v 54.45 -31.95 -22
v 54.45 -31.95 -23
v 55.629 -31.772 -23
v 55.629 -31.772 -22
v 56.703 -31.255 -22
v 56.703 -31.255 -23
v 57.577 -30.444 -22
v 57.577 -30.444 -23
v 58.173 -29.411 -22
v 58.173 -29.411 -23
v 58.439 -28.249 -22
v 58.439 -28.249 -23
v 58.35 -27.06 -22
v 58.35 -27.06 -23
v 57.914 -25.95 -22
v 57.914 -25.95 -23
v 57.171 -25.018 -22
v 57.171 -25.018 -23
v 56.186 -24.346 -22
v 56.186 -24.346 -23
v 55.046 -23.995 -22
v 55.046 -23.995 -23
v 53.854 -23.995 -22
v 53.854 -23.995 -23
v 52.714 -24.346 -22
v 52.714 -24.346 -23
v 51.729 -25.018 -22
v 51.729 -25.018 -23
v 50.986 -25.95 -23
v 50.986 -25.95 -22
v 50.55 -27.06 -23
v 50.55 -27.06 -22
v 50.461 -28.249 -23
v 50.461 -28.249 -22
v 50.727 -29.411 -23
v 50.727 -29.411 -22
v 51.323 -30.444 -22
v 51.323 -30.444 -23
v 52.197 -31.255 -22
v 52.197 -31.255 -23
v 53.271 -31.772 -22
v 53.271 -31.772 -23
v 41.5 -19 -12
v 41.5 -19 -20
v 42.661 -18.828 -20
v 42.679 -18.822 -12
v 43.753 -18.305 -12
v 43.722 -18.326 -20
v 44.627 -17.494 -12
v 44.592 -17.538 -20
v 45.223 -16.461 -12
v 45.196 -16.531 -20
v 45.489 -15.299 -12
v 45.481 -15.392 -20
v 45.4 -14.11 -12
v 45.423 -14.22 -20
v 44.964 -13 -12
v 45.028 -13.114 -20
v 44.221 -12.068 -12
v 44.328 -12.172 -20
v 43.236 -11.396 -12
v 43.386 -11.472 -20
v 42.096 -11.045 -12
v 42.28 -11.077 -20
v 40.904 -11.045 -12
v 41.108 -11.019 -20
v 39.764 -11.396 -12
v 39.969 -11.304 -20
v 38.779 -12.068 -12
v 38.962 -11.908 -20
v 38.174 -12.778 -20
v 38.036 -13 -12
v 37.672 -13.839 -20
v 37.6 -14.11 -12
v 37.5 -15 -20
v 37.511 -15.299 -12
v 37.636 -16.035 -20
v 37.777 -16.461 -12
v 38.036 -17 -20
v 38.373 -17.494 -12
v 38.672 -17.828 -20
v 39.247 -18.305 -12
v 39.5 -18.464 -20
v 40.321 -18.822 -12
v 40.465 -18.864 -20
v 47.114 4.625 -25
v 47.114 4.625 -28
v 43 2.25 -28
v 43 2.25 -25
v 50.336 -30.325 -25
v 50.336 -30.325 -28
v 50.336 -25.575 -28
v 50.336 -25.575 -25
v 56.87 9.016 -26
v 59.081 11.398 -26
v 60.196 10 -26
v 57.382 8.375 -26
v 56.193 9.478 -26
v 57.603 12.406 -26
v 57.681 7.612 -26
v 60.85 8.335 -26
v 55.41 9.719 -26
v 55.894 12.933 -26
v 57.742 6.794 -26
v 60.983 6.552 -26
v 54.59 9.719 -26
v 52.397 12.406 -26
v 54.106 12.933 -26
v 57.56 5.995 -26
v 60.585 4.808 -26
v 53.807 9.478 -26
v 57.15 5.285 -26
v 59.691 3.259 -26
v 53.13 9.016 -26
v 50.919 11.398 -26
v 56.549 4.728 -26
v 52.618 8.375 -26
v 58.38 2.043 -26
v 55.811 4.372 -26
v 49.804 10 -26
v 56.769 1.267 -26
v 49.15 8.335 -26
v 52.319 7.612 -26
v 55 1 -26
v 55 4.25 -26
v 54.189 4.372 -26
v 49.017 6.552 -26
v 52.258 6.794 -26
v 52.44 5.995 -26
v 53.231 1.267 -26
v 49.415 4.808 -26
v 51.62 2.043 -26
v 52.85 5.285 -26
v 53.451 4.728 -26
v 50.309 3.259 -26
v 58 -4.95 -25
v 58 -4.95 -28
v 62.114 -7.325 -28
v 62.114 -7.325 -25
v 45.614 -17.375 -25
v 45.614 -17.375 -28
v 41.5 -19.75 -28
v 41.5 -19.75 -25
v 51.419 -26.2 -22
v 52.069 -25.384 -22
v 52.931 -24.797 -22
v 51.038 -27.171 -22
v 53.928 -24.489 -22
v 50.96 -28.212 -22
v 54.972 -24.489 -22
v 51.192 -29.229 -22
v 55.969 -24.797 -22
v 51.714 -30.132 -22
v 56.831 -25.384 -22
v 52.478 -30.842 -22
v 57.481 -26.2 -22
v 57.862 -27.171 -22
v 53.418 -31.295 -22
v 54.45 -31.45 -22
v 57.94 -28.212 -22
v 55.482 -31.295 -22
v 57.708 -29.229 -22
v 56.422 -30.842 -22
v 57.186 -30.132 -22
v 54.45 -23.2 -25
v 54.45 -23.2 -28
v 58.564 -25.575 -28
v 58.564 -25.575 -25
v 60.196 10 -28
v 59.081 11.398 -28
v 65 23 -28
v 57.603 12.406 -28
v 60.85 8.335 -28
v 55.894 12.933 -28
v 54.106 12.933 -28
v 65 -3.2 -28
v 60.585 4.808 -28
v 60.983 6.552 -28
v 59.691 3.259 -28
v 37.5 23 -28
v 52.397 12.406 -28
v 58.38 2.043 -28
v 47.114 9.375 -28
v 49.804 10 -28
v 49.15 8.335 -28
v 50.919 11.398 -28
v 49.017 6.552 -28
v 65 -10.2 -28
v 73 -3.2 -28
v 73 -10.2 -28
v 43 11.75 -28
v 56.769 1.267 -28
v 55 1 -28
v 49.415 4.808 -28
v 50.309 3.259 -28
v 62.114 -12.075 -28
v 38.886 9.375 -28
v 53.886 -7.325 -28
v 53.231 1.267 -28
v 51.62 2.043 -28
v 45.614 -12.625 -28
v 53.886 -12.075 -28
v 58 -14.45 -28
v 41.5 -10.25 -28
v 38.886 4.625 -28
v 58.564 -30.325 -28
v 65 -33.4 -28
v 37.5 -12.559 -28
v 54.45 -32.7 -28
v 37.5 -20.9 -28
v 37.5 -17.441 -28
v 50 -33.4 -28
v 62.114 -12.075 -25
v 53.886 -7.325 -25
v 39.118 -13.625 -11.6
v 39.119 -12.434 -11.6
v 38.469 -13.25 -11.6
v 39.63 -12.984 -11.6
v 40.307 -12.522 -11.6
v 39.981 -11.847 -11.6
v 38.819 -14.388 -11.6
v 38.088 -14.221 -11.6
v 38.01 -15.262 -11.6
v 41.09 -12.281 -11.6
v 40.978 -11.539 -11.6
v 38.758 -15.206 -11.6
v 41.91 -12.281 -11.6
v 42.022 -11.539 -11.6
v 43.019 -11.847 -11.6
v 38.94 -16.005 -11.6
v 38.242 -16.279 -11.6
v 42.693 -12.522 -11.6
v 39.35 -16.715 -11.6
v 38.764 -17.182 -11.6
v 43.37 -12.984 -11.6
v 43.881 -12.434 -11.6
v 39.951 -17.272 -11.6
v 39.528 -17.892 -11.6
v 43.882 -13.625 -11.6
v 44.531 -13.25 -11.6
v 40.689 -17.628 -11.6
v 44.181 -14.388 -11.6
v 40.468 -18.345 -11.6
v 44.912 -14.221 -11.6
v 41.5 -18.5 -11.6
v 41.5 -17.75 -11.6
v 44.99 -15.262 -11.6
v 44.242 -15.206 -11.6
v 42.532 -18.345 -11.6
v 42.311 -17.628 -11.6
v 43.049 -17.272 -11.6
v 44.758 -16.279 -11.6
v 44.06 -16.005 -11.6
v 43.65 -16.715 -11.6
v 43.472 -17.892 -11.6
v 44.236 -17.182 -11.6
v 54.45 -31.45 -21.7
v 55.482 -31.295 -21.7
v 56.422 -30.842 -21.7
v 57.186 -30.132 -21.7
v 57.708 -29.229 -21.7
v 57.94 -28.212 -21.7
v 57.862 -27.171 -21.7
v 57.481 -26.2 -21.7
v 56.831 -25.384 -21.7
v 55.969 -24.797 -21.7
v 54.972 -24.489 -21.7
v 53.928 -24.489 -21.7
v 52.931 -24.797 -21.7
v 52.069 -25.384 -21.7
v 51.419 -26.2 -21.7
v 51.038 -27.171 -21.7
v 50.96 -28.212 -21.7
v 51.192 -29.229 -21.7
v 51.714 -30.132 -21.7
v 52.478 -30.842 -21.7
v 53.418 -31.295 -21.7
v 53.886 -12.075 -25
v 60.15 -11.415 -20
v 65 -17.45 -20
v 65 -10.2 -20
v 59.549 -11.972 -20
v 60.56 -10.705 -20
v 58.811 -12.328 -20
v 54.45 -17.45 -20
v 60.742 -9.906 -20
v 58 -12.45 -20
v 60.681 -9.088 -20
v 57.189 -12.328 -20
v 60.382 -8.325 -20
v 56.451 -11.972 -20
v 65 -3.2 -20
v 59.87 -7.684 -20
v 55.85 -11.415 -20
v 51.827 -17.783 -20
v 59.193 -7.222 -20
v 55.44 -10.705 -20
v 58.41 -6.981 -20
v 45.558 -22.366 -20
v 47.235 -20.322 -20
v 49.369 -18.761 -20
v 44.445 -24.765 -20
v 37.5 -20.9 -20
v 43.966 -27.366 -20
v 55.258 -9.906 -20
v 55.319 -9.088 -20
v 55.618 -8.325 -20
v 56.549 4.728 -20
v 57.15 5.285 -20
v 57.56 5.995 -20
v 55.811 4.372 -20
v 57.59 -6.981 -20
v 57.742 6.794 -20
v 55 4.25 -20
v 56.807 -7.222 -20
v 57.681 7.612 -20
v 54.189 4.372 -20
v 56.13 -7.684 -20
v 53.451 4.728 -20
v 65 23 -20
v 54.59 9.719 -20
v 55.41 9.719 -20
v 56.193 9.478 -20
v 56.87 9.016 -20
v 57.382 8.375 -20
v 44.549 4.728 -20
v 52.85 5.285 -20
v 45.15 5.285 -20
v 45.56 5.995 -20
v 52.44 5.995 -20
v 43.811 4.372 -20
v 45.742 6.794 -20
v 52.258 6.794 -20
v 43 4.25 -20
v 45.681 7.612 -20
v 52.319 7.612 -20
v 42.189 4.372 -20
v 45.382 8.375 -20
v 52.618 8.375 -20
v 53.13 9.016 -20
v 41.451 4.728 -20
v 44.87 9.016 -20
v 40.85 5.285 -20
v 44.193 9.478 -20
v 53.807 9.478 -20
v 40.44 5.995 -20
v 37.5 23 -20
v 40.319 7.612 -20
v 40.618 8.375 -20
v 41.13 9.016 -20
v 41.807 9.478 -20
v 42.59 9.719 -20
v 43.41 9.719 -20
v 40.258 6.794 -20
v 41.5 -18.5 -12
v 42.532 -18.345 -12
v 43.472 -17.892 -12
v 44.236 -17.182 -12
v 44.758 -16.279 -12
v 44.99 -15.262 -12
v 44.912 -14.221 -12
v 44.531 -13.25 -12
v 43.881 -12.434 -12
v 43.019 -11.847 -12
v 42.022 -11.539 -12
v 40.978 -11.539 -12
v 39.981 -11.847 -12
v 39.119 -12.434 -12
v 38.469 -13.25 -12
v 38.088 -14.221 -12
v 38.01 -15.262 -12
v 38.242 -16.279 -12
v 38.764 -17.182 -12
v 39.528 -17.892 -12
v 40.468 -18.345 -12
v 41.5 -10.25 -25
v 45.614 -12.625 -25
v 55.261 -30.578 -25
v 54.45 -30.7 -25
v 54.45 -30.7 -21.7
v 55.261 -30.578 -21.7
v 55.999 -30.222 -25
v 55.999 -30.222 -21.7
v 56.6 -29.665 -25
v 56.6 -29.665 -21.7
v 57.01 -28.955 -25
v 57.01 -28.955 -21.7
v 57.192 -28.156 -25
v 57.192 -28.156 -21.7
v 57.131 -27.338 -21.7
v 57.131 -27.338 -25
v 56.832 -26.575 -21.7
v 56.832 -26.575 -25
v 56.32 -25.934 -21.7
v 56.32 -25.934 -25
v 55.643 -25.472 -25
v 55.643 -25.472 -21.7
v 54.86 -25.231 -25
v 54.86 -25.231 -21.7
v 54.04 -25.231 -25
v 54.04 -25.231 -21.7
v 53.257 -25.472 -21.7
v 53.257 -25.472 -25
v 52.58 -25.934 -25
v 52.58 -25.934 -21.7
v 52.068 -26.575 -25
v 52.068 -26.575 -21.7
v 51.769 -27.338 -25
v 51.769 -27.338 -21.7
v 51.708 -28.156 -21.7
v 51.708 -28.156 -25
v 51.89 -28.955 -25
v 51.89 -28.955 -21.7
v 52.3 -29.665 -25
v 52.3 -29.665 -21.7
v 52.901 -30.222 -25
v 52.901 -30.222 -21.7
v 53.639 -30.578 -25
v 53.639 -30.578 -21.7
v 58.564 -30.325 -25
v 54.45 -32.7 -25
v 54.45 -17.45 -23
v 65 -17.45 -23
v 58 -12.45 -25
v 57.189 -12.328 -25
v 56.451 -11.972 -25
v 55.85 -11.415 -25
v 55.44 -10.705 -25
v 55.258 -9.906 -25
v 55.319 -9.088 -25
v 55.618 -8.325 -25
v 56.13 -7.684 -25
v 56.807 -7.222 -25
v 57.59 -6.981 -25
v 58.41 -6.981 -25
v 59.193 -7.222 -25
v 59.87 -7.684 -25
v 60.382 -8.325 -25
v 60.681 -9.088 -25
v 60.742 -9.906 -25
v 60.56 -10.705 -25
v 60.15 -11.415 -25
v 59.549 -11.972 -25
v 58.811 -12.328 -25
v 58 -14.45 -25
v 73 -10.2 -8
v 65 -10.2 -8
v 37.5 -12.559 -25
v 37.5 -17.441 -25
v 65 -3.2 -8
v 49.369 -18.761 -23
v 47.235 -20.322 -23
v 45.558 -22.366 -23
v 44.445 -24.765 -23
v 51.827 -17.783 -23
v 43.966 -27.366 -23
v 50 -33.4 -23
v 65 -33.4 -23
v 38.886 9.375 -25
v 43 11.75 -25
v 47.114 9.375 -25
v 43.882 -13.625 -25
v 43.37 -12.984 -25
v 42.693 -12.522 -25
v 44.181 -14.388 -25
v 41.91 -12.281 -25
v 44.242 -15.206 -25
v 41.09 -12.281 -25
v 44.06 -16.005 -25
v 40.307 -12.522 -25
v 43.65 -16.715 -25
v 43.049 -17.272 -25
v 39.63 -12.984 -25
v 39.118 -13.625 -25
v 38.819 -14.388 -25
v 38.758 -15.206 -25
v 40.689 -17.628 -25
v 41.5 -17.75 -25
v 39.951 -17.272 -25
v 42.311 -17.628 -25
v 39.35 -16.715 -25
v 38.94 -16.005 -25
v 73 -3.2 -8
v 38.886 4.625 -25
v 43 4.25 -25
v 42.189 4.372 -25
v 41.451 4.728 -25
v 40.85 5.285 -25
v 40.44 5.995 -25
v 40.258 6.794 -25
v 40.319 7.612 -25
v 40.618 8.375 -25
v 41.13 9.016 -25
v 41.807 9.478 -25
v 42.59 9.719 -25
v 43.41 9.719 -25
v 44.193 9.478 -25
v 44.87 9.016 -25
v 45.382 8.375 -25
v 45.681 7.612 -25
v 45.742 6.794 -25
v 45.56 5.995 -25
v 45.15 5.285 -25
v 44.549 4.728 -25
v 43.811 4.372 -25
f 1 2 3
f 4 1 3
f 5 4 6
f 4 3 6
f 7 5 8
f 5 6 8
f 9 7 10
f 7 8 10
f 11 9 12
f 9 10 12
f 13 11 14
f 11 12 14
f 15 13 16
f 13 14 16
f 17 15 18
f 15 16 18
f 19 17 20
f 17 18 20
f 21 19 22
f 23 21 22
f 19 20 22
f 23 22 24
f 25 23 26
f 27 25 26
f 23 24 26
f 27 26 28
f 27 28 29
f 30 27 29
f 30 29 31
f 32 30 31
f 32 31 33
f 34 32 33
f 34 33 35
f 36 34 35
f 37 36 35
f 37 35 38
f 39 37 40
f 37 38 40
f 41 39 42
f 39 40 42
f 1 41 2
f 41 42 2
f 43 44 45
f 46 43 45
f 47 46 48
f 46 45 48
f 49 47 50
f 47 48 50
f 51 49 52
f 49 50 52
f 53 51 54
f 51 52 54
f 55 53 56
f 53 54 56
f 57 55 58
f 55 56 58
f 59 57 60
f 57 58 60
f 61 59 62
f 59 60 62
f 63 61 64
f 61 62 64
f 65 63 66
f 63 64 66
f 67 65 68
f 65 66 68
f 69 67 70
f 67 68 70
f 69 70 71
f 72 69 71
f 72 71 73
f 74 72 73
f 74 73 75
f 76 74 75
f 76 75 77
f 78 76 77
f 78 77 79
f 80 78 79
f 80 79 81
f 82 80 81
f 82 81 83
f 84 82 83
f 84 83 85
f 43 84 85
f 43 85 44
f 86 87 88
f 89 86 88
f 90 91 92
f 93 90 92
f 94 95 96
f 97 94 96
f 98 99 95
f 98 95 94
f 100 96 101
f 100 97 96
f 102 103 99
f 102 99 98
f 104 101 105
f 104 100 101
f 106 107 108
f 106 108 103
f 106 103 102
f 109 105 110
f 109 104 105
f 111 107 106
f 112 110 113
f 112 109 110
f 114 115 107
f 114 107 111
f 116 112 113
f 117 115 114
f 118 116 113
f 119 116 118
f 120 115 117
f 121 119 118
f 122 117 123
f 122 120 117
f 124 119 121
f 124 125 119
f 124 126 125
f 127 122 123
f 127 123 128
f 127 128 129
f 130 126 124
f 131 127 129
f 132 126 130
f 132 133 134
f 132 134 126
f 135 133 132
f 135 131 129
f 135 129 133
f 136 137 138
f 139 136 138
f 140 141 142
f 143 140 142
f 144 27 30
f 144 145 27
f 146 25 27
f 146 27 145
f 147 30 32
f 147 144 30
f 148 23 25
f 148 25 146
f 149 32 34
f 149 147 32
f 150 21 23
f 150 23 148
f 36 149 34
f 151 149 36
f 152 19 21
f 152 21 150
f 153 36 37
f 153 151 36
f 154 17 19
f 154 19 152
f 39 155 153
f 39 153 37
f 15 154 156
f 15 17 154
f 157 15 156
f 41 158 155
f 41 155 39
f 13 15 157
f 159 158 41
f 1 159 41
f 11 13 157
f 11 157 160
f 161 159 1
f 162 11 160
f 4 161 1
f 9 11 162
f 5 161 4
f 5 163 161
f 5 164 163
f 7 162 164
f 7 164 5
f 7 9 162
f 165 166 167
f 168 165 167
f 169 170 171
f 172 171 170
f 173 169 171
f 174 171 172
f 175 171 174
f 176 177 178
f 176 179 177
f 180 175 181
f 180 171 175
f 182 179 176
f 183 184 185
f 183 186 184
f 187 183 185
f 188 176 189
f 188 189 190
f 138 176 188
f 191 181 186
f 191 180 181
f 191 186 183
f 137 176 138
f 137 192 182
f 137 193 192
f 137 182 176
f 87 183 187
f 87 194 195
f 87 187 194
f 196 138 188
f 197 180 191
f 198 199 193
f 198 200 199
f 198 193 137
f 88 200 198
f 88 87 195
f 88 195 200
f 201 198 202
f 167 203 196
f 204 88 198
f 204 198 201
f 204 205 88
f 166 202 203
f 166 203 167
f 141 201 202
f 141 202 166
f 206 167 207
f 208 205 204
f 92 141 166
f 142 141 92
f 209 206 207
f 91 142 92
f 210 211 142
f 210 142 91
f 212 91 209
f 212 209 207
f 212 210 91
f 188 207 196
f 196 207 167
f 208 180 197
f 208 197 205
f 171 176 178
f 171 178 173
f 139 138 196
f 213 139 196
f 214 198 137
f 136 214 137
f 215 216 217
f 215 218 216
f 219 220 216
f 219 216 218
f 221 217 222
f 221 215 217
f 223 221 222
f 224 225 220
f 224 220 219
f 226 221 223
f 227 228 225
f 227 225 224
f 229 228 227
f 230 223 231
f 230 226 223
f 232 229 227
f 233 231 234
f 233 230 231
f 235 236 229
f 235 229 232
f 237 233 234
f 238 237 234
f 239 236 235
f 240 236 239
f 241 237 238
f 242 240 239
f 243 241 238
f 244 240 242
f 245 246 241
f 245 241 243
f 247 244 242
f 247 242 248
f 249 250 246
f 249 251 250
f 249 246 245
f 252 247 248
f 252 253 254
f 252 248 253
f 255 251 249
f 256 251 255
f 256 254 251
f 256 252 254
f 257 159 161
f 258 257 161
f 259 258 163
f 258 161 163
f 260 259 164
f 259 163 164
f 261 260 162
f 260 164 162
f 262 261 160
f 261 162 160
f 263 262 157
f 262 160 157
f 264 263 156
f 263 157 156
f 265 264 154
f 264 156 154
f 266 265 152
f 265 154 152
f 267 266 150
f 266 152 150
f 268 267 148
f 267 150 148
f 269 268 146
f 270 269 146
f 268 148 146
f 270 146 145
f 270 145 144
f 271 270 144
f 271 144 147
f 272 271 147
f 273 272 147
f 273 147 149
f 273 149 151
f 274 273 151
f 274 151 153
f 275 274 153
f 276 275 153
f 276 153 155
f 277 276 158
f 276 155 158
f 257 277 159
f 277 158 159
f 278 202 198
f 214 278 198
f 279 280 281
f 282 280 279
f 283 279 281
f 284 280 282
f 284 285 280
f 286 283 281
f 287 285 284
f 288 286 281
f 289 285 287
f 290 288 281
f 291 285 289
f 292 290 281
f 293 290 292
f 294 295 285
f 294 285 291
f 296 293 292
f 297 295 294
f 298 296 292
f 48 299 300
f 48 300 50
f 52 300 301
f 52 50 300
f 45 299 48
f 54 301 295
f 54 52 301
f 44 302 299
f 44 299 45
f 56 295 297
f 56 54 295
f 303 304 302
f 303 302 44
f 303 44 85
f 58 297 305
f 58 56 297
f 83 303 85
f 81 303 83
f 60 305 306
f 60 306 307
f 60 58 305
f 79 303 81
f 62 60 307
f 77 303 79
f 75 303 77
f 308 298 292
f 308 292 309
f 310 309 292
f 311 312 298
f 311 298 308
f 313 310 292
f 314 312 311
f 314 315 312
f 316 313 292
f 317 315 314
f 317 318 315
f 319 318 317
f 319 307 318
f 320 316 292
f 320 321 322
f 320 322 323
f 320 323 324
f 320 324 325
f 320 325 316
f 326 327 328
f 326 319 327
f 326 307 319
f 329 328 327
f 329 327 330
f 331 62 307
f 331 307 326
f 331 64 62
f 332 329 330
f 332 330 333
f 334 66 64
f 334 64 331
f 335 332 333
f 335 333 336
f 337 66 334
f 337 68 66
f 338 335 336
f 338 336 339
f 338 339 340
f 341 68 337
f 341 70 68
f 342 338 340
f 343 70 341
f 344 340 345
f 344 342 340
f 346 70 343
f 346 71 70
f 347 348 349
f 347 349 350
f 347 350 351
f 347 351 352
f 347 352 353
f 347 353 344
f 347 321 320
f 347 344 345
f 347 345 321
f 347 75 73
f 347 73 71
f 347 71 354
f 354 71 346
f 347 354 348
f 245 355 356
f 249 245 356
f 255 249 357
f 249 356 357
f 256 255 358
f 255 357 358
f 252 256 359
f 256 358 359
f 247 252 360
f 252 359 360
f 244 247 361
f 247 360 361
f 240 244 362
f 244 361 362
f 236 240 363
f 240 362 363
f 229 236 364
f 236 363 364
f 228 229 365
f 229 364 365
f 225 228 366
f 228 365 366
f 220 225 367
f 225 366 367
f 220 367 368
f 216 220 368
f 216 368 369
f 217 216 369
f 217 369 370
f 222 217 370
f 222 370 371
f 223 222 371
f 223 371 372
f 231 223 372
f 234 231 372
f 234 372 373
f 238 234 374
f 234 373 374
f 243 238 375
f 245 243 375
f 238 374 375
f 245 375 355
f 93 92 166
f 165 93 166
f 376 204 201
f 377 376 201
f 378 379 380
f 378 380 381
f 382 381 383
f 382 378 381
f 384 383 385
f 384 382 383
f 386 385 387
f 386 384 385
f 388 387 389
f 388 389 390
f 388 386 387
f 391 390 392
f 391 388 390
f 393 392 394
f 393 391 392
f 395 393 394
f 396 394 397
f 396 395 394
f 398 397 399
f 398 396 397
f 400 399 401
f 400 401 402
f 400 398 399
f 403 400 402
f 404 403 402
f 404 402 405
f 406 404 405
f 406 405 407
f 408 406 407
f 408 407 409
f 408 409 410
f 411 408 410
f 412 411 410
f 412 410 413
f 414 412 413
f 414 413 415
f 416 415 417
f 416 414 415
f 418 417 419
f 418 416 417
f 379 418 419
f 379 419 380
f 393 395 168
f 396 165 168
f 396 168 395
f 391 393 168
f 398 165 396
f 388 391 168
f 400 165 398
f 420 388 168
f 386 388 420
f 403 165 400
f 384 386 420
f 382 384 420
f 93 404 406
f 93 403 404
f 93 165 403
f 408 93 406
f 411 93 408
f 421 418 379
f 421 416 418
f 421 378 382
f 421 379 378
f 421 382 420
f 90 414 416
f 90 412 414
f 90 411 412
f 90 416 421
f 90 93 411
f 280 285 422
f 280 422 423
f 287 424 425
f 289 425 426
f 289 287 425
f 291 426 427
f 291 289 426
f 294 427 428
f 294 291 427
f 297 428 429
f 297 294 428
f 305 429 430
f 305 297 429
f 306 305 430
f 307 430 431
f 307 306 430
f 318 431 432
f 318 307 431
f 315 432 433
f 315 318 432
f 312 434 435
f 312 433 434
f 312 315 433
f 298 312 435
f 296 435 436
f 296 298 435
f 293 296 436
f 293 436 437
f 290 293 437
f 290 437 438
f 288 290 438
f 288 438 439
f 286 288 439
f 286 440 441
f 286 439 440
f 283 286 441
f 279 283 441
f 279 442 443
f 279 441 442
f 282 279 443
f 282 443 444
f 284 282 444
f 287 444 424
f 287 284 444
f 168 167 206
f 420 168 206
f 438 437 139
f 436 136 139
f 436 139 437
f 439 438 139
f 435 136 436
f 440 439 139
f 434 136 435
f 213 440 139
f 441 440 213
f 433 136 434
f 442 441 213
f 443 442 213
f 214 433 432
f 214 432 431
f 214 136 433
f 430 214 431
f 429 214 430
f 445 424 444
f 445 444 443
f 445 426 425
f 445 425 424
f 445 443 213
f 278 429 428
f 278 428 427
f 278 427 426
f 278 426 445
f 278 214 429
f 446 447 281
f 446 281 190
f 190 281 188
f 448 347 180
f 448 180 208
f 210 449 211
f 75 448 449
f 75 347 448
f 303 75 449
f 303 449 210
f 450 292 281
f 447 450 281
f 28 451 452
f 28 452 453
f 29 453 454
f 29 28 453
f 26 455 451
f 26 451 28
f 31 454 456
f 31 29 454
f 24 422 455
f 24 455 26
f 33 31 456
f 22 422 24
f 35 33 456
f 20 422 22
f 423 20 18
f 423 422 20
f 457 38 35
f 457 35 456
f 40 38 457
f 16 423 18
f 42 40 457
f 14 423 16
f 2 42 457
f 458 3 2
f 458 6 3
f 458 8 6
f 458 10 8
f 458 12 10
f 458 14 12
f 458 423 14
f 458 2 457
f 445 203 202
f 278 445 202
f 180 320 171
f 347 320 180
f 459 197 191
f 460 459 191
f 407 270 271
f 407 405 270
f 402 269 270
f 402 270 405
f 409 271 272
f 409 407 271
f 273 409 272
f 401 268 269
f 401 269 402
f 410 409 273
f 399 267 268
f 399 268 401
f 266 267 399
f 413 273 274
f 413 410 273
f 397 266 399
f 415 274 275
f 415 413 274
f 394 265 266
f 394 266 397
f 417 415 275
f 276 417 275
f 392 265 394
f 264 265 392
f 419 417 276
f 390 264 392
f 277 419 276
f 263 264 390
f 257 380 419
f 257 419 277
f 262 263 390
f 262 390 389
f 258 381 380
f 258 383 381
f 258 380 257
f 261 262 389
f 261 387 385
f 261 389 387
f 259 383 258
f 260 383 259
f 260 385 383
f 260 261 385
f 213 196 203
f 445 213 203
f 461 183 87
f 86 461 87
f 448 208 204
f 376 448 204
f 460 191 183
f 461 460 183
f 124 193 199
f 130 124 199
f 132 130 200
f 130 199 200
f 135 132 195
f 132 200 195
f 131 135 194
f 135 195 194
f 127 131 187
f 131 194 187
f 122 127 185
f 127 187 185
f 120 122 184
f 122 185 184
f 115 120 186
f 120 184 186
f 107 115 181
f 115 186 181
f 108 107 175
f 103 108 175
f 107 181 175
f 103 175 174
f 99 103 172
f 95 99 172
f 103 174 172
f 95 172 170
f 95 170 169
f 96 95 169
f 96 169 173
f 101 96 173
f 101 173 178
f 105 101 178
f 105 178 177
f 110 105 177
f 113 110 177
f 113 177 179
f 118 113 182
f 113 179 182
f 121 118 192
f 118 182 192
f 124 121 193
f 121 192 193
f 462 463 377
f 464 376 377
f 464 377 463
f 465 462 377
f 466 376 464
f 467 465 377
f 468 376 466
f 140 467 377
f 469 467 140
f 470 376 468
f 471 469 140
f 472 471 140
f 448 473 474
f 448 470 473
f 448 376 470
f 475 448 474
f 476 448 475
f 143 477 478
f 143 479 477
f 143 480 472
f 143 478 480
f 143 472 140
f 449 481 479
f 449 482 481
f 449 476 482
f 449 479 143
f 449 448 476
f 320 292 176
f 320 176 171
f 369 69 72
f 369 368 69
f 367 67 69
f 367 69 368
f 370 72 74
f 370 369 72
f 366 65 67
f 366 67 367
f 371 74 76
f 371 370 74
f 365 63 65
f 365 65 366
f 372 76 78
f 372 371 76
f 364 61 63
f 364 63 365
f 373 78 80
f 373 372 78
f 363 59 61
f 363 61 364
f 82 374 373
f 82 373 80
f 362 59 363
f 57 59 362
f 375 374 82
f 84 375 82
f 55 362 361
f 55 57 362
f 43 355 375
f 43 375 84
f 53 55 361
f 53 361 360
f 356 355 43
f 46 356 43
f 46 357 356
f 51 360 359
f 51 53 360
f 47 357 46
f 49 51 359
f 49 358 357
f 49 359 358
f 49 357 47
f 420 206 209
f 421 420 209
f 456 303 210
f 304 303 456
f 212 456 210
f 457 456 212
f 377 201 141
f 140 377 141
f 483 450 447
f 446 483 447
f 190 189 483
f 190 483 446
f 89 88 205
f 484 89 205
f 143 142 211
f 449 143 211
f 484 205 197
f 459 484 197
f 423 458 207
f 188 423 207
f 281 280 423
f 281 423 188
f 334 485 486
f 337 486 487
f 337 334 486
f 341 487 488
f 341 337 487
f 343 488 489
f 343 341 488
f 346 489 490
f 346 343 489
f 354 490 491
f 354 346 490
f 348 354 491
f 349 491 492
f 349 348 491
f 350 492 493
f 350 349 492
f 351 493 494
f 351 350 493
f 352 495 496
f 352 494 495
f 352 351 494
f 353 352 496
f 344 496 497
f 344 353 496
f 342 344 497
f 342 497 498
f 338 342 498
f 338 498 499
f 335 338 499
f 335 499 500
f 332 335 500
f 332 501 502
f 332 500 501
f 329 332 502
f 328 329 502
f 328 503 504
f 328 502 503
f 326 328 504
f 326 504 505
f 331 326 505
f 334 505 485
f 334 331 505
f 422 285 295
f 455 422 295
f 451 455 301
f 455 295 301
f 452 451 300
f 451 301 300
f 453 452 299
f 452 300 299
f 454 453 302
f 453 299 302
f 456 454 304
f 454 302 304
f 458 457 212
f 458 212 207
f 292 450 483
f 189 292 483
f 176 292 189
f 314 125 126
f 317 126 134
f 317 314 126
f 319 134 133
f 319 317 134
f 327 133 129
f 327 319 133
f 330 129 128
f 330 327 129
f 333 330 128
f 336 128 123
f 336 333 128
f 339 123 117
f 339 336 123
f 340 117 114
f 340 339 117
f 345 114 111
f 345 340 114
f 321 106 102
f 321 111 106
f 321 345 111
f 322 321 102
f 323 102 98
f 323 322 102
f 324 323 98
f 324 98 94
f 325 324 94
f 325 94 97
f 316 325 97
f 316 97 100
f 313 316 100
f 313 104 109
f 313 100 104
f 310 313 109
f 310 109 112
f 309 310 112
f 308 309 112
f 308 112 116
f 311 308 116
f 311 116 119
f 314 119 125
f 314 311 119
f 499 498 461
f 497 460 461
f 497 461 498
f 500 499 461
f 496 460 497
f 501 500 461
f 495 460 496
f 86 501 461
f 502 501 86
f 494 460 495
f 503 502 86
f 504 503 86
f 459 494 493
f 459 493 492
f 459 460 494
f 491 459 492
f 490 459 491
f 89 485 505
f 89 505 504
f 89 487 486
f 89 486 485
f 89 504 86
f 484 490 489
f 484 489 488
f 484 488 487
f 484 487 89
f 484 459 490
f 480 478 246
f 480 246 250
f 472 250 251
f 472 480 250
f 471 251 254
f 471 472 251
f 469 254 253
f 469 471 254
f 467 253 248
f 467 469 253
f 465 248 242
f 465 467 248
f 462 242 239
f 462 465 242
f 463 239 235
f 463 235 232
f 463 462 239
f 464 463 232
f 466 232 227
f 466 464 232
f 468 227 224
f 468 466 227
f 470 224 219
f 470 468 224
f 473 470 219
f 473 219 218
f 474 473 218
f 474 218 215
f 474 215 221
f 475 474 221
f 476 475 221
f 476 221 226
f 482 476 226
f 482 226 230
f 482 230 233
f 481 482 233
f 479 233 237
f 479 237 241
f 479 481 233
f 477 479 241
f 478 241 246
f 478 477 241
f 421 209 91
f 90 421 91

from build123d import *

# Parameters (mm, degrees)
SKETCH007_R             = 2.75
PAD004_DEPTH            = 8
POCKET003_DEPTH         = 3
SKETCH013_R             = 4
SKETCH013_R_2           = 2.75
PAD009_DEPTH            = 1
SKETCH014_R             = 3.5
SKETCH014_R_2           = 2.75
PAD010_DEPTH            = 0.3
SKETCH015_R             = 4
SKETCH015_R_2           = 2.75
PAD011_DEPTH            = 8
SKETCH016_R             = 3.5
SKETCH016_R_2           = 2.75
PAD012_DEPTH            = 0.4
SKETCH018_R             = 6
POCKET005_DEPTH         = 2
POCKET006_DEPTH         = 3
SKETCH022_W             = 7
SKETCH022_H             = 20
PAD015_DEPTH            = 8
BODY001_ROLL_ANGLE      = 180
BODY001_PLACEMENT_ANGLE = -90


with BuildPart() as part:
    # Sketch007 → Pad004 (new body)
    with BuildSketch(Plane.XY):
        Polygon((0, 27.5), (43.9, 27.5), (56.4, 15), (56.4, 0), (0, 0), align=None)
        with Locations((16, 22)):
            Circle(SKETCH007_R, mode=Mode.SUBTRACT)
        with Locations((16, 10)):
            Circle(SKETCH007_R, mode=Mode.SUBTRACT)
        with Locations((38, 23.5)):
            Circle(SKETCH007_R, mode=Mode.SUBTRACT)
        with Locations((32.7, 7)):
            Circle(SKETCH007_R, mode=Mode.SUBTRACT)
        with Locations((50.95, 10.55)):
            Circle(SKETCH007_R, mode=Mode.SUBTRACT)
    extrude(amount=PAD004_DEPTH)

    # Sketch012 (on Face11 of Pad004) → Pocket003 (cut)
    with BuildSketch(Plane(origin=(0, 0, 0), x_dir=(1, 0, 0), z_dir=(0, 0, -1))):
        with BuildLine():
            ThreePointArc((40.45, -10.55), (43.525379, -17.974621), (50.95, -21.05))
            Line((50.95, -21.05), (70.95, -21.05))
            Line((70.95, -21.05), (70.95, 0))
            Line((70.95, 0), (40.45, 0))
            Line((40.45, -10.55), (40.45, 0))
        make_face()
    extrude(amount=-POCKET003_DEPTH, mode=Mode.SUBTRACT)

    # Sketch013 (on Face8 of Pocket003) → Pad009 (join)
    with BuildSketch(Plane(origin=(0, 0, 3), x_dir=(1, 0, 0), z_dir=(0, 0, -1))):
        with Locations((50.95, -10.55)):
            Circle(SKETCH013_R)
        with Locations((50.95, -10.55)):
            Circle(SKETCH013_R_2, mode=Mode.SUBTRACT)
    extrude(amount=PAD009_DEPTH)

    # Sketch014 (on Face16 of Pad009) → Pad010 (join)
    with BuildSketch(Plane(origin=(0, 0, 2), x_dir=(1, 0, 0), z_dir=(0, 0, -1))):
        with Locations((50.95, -10.55)):
            Circle(SKETCH014_R)
        with Locations((50.95, -10.55)):
            Circle(SKETCH014_R_2, mode=Mode.SUBTRACT)
    extrude(amount=PAD010_DEPTH)

    # Sketch015 (on Face4 of Pad010) → Pad011 (join)
    with BuildSketch(Plane(origin=(0, 0, 0), x_dir=(1, 0, 0), z_dir=(0, 0, -1))):
        with Locations((38, -23.5)):
            Circle(SKETCH015_R)
        with Locations((38, -23.5)):
            Circle(SKETCH015_R_2, mode=Mode.SUBTRACT)
    extrude(amount=PAD011_DEPTH)

    # Sketch016 (on Face17 of Pad011) → Pad012 (join)
    with BuildSketch(Plane(origin=(0, 0, -8), x_dir=(1, 0, 0), z_dir=(0, 0, -1))):
        with Locations((38, -23.5)):
            Circle(SKETCH016_R)
        with Locations((38, -23.5)):
            Circle(SKETCH016_R_2, mode=Mode.SUBTRACT)
    extrude(amount=PAD012_DEPTH)

    # Sketch018 (on Face5 of Pad012) → Pocket005 (cut)
    with BuildSketch(Plane.XY.offset(8)):
        with Locations((16, 10)):
            Circle(SKETCH018_R)
    extrude(amount=-POCKET005_DEPTH, mode=Mode.SUBTRACT)

    # Sketch019 (on Face5 of Pocket005) → Pocket006 (cut)
    with BuildSketch(Plane.XY.offset(8)):
        Polygon((20.75, 22), (18.375, 26.113621), (13.625, 26.113621), (11.25, 22), (13.625, 17.886379), (18.375, 17.886379), align=None)
        Polygon((42.75, 23.5), (40.375, 27.613621), (35.625, 27.613621), (33.25, 23.5), (35.625, 19.386379), (40.375, 19.386379), align=None)
        Polygon((37.45, 7), (35.075, 11.113621), (30.325, 11.113621), (27.95, 7), (30.325, 2.886379), (35.075, 2.886379), align=None)
        Polygon((55.7, 10.55), (53.325, 14.663621), (48.575, 14.663621), (46.2, 10.55), (48.575, 6.436379), (53.325, 6.436379), align=None)
    extrude(amount=-POCKET006_DEPTH, mode=Mode.SUBTRACT)

    # Sketch022 (on Face9 of Pocket006) → Pad015 (join)
    with BuildSketch(Plane.XZ):
        with Locations((29.7, -2)):
            Rectangle(SKETCH022_W, SKETCH022_H)
    extrude(amount=PAD015_DEPTH)


with BuildPart() as part_1:
    # Body001 roll: moved
    add(part.part.rotate(Axis((0, 0, 0), (1, 0, 0)), BODY001_ROLL_ANGLE))


with BuildPart() as part_2:
    # Body001 placement: moved
    add(part_1.part.moved(Location((65, 23, -20))).rotate(Axis((65, 23, -20), (0, 0, 1)), BODY001_PLACEMENT_ANGLE))


solid = part_2.part
